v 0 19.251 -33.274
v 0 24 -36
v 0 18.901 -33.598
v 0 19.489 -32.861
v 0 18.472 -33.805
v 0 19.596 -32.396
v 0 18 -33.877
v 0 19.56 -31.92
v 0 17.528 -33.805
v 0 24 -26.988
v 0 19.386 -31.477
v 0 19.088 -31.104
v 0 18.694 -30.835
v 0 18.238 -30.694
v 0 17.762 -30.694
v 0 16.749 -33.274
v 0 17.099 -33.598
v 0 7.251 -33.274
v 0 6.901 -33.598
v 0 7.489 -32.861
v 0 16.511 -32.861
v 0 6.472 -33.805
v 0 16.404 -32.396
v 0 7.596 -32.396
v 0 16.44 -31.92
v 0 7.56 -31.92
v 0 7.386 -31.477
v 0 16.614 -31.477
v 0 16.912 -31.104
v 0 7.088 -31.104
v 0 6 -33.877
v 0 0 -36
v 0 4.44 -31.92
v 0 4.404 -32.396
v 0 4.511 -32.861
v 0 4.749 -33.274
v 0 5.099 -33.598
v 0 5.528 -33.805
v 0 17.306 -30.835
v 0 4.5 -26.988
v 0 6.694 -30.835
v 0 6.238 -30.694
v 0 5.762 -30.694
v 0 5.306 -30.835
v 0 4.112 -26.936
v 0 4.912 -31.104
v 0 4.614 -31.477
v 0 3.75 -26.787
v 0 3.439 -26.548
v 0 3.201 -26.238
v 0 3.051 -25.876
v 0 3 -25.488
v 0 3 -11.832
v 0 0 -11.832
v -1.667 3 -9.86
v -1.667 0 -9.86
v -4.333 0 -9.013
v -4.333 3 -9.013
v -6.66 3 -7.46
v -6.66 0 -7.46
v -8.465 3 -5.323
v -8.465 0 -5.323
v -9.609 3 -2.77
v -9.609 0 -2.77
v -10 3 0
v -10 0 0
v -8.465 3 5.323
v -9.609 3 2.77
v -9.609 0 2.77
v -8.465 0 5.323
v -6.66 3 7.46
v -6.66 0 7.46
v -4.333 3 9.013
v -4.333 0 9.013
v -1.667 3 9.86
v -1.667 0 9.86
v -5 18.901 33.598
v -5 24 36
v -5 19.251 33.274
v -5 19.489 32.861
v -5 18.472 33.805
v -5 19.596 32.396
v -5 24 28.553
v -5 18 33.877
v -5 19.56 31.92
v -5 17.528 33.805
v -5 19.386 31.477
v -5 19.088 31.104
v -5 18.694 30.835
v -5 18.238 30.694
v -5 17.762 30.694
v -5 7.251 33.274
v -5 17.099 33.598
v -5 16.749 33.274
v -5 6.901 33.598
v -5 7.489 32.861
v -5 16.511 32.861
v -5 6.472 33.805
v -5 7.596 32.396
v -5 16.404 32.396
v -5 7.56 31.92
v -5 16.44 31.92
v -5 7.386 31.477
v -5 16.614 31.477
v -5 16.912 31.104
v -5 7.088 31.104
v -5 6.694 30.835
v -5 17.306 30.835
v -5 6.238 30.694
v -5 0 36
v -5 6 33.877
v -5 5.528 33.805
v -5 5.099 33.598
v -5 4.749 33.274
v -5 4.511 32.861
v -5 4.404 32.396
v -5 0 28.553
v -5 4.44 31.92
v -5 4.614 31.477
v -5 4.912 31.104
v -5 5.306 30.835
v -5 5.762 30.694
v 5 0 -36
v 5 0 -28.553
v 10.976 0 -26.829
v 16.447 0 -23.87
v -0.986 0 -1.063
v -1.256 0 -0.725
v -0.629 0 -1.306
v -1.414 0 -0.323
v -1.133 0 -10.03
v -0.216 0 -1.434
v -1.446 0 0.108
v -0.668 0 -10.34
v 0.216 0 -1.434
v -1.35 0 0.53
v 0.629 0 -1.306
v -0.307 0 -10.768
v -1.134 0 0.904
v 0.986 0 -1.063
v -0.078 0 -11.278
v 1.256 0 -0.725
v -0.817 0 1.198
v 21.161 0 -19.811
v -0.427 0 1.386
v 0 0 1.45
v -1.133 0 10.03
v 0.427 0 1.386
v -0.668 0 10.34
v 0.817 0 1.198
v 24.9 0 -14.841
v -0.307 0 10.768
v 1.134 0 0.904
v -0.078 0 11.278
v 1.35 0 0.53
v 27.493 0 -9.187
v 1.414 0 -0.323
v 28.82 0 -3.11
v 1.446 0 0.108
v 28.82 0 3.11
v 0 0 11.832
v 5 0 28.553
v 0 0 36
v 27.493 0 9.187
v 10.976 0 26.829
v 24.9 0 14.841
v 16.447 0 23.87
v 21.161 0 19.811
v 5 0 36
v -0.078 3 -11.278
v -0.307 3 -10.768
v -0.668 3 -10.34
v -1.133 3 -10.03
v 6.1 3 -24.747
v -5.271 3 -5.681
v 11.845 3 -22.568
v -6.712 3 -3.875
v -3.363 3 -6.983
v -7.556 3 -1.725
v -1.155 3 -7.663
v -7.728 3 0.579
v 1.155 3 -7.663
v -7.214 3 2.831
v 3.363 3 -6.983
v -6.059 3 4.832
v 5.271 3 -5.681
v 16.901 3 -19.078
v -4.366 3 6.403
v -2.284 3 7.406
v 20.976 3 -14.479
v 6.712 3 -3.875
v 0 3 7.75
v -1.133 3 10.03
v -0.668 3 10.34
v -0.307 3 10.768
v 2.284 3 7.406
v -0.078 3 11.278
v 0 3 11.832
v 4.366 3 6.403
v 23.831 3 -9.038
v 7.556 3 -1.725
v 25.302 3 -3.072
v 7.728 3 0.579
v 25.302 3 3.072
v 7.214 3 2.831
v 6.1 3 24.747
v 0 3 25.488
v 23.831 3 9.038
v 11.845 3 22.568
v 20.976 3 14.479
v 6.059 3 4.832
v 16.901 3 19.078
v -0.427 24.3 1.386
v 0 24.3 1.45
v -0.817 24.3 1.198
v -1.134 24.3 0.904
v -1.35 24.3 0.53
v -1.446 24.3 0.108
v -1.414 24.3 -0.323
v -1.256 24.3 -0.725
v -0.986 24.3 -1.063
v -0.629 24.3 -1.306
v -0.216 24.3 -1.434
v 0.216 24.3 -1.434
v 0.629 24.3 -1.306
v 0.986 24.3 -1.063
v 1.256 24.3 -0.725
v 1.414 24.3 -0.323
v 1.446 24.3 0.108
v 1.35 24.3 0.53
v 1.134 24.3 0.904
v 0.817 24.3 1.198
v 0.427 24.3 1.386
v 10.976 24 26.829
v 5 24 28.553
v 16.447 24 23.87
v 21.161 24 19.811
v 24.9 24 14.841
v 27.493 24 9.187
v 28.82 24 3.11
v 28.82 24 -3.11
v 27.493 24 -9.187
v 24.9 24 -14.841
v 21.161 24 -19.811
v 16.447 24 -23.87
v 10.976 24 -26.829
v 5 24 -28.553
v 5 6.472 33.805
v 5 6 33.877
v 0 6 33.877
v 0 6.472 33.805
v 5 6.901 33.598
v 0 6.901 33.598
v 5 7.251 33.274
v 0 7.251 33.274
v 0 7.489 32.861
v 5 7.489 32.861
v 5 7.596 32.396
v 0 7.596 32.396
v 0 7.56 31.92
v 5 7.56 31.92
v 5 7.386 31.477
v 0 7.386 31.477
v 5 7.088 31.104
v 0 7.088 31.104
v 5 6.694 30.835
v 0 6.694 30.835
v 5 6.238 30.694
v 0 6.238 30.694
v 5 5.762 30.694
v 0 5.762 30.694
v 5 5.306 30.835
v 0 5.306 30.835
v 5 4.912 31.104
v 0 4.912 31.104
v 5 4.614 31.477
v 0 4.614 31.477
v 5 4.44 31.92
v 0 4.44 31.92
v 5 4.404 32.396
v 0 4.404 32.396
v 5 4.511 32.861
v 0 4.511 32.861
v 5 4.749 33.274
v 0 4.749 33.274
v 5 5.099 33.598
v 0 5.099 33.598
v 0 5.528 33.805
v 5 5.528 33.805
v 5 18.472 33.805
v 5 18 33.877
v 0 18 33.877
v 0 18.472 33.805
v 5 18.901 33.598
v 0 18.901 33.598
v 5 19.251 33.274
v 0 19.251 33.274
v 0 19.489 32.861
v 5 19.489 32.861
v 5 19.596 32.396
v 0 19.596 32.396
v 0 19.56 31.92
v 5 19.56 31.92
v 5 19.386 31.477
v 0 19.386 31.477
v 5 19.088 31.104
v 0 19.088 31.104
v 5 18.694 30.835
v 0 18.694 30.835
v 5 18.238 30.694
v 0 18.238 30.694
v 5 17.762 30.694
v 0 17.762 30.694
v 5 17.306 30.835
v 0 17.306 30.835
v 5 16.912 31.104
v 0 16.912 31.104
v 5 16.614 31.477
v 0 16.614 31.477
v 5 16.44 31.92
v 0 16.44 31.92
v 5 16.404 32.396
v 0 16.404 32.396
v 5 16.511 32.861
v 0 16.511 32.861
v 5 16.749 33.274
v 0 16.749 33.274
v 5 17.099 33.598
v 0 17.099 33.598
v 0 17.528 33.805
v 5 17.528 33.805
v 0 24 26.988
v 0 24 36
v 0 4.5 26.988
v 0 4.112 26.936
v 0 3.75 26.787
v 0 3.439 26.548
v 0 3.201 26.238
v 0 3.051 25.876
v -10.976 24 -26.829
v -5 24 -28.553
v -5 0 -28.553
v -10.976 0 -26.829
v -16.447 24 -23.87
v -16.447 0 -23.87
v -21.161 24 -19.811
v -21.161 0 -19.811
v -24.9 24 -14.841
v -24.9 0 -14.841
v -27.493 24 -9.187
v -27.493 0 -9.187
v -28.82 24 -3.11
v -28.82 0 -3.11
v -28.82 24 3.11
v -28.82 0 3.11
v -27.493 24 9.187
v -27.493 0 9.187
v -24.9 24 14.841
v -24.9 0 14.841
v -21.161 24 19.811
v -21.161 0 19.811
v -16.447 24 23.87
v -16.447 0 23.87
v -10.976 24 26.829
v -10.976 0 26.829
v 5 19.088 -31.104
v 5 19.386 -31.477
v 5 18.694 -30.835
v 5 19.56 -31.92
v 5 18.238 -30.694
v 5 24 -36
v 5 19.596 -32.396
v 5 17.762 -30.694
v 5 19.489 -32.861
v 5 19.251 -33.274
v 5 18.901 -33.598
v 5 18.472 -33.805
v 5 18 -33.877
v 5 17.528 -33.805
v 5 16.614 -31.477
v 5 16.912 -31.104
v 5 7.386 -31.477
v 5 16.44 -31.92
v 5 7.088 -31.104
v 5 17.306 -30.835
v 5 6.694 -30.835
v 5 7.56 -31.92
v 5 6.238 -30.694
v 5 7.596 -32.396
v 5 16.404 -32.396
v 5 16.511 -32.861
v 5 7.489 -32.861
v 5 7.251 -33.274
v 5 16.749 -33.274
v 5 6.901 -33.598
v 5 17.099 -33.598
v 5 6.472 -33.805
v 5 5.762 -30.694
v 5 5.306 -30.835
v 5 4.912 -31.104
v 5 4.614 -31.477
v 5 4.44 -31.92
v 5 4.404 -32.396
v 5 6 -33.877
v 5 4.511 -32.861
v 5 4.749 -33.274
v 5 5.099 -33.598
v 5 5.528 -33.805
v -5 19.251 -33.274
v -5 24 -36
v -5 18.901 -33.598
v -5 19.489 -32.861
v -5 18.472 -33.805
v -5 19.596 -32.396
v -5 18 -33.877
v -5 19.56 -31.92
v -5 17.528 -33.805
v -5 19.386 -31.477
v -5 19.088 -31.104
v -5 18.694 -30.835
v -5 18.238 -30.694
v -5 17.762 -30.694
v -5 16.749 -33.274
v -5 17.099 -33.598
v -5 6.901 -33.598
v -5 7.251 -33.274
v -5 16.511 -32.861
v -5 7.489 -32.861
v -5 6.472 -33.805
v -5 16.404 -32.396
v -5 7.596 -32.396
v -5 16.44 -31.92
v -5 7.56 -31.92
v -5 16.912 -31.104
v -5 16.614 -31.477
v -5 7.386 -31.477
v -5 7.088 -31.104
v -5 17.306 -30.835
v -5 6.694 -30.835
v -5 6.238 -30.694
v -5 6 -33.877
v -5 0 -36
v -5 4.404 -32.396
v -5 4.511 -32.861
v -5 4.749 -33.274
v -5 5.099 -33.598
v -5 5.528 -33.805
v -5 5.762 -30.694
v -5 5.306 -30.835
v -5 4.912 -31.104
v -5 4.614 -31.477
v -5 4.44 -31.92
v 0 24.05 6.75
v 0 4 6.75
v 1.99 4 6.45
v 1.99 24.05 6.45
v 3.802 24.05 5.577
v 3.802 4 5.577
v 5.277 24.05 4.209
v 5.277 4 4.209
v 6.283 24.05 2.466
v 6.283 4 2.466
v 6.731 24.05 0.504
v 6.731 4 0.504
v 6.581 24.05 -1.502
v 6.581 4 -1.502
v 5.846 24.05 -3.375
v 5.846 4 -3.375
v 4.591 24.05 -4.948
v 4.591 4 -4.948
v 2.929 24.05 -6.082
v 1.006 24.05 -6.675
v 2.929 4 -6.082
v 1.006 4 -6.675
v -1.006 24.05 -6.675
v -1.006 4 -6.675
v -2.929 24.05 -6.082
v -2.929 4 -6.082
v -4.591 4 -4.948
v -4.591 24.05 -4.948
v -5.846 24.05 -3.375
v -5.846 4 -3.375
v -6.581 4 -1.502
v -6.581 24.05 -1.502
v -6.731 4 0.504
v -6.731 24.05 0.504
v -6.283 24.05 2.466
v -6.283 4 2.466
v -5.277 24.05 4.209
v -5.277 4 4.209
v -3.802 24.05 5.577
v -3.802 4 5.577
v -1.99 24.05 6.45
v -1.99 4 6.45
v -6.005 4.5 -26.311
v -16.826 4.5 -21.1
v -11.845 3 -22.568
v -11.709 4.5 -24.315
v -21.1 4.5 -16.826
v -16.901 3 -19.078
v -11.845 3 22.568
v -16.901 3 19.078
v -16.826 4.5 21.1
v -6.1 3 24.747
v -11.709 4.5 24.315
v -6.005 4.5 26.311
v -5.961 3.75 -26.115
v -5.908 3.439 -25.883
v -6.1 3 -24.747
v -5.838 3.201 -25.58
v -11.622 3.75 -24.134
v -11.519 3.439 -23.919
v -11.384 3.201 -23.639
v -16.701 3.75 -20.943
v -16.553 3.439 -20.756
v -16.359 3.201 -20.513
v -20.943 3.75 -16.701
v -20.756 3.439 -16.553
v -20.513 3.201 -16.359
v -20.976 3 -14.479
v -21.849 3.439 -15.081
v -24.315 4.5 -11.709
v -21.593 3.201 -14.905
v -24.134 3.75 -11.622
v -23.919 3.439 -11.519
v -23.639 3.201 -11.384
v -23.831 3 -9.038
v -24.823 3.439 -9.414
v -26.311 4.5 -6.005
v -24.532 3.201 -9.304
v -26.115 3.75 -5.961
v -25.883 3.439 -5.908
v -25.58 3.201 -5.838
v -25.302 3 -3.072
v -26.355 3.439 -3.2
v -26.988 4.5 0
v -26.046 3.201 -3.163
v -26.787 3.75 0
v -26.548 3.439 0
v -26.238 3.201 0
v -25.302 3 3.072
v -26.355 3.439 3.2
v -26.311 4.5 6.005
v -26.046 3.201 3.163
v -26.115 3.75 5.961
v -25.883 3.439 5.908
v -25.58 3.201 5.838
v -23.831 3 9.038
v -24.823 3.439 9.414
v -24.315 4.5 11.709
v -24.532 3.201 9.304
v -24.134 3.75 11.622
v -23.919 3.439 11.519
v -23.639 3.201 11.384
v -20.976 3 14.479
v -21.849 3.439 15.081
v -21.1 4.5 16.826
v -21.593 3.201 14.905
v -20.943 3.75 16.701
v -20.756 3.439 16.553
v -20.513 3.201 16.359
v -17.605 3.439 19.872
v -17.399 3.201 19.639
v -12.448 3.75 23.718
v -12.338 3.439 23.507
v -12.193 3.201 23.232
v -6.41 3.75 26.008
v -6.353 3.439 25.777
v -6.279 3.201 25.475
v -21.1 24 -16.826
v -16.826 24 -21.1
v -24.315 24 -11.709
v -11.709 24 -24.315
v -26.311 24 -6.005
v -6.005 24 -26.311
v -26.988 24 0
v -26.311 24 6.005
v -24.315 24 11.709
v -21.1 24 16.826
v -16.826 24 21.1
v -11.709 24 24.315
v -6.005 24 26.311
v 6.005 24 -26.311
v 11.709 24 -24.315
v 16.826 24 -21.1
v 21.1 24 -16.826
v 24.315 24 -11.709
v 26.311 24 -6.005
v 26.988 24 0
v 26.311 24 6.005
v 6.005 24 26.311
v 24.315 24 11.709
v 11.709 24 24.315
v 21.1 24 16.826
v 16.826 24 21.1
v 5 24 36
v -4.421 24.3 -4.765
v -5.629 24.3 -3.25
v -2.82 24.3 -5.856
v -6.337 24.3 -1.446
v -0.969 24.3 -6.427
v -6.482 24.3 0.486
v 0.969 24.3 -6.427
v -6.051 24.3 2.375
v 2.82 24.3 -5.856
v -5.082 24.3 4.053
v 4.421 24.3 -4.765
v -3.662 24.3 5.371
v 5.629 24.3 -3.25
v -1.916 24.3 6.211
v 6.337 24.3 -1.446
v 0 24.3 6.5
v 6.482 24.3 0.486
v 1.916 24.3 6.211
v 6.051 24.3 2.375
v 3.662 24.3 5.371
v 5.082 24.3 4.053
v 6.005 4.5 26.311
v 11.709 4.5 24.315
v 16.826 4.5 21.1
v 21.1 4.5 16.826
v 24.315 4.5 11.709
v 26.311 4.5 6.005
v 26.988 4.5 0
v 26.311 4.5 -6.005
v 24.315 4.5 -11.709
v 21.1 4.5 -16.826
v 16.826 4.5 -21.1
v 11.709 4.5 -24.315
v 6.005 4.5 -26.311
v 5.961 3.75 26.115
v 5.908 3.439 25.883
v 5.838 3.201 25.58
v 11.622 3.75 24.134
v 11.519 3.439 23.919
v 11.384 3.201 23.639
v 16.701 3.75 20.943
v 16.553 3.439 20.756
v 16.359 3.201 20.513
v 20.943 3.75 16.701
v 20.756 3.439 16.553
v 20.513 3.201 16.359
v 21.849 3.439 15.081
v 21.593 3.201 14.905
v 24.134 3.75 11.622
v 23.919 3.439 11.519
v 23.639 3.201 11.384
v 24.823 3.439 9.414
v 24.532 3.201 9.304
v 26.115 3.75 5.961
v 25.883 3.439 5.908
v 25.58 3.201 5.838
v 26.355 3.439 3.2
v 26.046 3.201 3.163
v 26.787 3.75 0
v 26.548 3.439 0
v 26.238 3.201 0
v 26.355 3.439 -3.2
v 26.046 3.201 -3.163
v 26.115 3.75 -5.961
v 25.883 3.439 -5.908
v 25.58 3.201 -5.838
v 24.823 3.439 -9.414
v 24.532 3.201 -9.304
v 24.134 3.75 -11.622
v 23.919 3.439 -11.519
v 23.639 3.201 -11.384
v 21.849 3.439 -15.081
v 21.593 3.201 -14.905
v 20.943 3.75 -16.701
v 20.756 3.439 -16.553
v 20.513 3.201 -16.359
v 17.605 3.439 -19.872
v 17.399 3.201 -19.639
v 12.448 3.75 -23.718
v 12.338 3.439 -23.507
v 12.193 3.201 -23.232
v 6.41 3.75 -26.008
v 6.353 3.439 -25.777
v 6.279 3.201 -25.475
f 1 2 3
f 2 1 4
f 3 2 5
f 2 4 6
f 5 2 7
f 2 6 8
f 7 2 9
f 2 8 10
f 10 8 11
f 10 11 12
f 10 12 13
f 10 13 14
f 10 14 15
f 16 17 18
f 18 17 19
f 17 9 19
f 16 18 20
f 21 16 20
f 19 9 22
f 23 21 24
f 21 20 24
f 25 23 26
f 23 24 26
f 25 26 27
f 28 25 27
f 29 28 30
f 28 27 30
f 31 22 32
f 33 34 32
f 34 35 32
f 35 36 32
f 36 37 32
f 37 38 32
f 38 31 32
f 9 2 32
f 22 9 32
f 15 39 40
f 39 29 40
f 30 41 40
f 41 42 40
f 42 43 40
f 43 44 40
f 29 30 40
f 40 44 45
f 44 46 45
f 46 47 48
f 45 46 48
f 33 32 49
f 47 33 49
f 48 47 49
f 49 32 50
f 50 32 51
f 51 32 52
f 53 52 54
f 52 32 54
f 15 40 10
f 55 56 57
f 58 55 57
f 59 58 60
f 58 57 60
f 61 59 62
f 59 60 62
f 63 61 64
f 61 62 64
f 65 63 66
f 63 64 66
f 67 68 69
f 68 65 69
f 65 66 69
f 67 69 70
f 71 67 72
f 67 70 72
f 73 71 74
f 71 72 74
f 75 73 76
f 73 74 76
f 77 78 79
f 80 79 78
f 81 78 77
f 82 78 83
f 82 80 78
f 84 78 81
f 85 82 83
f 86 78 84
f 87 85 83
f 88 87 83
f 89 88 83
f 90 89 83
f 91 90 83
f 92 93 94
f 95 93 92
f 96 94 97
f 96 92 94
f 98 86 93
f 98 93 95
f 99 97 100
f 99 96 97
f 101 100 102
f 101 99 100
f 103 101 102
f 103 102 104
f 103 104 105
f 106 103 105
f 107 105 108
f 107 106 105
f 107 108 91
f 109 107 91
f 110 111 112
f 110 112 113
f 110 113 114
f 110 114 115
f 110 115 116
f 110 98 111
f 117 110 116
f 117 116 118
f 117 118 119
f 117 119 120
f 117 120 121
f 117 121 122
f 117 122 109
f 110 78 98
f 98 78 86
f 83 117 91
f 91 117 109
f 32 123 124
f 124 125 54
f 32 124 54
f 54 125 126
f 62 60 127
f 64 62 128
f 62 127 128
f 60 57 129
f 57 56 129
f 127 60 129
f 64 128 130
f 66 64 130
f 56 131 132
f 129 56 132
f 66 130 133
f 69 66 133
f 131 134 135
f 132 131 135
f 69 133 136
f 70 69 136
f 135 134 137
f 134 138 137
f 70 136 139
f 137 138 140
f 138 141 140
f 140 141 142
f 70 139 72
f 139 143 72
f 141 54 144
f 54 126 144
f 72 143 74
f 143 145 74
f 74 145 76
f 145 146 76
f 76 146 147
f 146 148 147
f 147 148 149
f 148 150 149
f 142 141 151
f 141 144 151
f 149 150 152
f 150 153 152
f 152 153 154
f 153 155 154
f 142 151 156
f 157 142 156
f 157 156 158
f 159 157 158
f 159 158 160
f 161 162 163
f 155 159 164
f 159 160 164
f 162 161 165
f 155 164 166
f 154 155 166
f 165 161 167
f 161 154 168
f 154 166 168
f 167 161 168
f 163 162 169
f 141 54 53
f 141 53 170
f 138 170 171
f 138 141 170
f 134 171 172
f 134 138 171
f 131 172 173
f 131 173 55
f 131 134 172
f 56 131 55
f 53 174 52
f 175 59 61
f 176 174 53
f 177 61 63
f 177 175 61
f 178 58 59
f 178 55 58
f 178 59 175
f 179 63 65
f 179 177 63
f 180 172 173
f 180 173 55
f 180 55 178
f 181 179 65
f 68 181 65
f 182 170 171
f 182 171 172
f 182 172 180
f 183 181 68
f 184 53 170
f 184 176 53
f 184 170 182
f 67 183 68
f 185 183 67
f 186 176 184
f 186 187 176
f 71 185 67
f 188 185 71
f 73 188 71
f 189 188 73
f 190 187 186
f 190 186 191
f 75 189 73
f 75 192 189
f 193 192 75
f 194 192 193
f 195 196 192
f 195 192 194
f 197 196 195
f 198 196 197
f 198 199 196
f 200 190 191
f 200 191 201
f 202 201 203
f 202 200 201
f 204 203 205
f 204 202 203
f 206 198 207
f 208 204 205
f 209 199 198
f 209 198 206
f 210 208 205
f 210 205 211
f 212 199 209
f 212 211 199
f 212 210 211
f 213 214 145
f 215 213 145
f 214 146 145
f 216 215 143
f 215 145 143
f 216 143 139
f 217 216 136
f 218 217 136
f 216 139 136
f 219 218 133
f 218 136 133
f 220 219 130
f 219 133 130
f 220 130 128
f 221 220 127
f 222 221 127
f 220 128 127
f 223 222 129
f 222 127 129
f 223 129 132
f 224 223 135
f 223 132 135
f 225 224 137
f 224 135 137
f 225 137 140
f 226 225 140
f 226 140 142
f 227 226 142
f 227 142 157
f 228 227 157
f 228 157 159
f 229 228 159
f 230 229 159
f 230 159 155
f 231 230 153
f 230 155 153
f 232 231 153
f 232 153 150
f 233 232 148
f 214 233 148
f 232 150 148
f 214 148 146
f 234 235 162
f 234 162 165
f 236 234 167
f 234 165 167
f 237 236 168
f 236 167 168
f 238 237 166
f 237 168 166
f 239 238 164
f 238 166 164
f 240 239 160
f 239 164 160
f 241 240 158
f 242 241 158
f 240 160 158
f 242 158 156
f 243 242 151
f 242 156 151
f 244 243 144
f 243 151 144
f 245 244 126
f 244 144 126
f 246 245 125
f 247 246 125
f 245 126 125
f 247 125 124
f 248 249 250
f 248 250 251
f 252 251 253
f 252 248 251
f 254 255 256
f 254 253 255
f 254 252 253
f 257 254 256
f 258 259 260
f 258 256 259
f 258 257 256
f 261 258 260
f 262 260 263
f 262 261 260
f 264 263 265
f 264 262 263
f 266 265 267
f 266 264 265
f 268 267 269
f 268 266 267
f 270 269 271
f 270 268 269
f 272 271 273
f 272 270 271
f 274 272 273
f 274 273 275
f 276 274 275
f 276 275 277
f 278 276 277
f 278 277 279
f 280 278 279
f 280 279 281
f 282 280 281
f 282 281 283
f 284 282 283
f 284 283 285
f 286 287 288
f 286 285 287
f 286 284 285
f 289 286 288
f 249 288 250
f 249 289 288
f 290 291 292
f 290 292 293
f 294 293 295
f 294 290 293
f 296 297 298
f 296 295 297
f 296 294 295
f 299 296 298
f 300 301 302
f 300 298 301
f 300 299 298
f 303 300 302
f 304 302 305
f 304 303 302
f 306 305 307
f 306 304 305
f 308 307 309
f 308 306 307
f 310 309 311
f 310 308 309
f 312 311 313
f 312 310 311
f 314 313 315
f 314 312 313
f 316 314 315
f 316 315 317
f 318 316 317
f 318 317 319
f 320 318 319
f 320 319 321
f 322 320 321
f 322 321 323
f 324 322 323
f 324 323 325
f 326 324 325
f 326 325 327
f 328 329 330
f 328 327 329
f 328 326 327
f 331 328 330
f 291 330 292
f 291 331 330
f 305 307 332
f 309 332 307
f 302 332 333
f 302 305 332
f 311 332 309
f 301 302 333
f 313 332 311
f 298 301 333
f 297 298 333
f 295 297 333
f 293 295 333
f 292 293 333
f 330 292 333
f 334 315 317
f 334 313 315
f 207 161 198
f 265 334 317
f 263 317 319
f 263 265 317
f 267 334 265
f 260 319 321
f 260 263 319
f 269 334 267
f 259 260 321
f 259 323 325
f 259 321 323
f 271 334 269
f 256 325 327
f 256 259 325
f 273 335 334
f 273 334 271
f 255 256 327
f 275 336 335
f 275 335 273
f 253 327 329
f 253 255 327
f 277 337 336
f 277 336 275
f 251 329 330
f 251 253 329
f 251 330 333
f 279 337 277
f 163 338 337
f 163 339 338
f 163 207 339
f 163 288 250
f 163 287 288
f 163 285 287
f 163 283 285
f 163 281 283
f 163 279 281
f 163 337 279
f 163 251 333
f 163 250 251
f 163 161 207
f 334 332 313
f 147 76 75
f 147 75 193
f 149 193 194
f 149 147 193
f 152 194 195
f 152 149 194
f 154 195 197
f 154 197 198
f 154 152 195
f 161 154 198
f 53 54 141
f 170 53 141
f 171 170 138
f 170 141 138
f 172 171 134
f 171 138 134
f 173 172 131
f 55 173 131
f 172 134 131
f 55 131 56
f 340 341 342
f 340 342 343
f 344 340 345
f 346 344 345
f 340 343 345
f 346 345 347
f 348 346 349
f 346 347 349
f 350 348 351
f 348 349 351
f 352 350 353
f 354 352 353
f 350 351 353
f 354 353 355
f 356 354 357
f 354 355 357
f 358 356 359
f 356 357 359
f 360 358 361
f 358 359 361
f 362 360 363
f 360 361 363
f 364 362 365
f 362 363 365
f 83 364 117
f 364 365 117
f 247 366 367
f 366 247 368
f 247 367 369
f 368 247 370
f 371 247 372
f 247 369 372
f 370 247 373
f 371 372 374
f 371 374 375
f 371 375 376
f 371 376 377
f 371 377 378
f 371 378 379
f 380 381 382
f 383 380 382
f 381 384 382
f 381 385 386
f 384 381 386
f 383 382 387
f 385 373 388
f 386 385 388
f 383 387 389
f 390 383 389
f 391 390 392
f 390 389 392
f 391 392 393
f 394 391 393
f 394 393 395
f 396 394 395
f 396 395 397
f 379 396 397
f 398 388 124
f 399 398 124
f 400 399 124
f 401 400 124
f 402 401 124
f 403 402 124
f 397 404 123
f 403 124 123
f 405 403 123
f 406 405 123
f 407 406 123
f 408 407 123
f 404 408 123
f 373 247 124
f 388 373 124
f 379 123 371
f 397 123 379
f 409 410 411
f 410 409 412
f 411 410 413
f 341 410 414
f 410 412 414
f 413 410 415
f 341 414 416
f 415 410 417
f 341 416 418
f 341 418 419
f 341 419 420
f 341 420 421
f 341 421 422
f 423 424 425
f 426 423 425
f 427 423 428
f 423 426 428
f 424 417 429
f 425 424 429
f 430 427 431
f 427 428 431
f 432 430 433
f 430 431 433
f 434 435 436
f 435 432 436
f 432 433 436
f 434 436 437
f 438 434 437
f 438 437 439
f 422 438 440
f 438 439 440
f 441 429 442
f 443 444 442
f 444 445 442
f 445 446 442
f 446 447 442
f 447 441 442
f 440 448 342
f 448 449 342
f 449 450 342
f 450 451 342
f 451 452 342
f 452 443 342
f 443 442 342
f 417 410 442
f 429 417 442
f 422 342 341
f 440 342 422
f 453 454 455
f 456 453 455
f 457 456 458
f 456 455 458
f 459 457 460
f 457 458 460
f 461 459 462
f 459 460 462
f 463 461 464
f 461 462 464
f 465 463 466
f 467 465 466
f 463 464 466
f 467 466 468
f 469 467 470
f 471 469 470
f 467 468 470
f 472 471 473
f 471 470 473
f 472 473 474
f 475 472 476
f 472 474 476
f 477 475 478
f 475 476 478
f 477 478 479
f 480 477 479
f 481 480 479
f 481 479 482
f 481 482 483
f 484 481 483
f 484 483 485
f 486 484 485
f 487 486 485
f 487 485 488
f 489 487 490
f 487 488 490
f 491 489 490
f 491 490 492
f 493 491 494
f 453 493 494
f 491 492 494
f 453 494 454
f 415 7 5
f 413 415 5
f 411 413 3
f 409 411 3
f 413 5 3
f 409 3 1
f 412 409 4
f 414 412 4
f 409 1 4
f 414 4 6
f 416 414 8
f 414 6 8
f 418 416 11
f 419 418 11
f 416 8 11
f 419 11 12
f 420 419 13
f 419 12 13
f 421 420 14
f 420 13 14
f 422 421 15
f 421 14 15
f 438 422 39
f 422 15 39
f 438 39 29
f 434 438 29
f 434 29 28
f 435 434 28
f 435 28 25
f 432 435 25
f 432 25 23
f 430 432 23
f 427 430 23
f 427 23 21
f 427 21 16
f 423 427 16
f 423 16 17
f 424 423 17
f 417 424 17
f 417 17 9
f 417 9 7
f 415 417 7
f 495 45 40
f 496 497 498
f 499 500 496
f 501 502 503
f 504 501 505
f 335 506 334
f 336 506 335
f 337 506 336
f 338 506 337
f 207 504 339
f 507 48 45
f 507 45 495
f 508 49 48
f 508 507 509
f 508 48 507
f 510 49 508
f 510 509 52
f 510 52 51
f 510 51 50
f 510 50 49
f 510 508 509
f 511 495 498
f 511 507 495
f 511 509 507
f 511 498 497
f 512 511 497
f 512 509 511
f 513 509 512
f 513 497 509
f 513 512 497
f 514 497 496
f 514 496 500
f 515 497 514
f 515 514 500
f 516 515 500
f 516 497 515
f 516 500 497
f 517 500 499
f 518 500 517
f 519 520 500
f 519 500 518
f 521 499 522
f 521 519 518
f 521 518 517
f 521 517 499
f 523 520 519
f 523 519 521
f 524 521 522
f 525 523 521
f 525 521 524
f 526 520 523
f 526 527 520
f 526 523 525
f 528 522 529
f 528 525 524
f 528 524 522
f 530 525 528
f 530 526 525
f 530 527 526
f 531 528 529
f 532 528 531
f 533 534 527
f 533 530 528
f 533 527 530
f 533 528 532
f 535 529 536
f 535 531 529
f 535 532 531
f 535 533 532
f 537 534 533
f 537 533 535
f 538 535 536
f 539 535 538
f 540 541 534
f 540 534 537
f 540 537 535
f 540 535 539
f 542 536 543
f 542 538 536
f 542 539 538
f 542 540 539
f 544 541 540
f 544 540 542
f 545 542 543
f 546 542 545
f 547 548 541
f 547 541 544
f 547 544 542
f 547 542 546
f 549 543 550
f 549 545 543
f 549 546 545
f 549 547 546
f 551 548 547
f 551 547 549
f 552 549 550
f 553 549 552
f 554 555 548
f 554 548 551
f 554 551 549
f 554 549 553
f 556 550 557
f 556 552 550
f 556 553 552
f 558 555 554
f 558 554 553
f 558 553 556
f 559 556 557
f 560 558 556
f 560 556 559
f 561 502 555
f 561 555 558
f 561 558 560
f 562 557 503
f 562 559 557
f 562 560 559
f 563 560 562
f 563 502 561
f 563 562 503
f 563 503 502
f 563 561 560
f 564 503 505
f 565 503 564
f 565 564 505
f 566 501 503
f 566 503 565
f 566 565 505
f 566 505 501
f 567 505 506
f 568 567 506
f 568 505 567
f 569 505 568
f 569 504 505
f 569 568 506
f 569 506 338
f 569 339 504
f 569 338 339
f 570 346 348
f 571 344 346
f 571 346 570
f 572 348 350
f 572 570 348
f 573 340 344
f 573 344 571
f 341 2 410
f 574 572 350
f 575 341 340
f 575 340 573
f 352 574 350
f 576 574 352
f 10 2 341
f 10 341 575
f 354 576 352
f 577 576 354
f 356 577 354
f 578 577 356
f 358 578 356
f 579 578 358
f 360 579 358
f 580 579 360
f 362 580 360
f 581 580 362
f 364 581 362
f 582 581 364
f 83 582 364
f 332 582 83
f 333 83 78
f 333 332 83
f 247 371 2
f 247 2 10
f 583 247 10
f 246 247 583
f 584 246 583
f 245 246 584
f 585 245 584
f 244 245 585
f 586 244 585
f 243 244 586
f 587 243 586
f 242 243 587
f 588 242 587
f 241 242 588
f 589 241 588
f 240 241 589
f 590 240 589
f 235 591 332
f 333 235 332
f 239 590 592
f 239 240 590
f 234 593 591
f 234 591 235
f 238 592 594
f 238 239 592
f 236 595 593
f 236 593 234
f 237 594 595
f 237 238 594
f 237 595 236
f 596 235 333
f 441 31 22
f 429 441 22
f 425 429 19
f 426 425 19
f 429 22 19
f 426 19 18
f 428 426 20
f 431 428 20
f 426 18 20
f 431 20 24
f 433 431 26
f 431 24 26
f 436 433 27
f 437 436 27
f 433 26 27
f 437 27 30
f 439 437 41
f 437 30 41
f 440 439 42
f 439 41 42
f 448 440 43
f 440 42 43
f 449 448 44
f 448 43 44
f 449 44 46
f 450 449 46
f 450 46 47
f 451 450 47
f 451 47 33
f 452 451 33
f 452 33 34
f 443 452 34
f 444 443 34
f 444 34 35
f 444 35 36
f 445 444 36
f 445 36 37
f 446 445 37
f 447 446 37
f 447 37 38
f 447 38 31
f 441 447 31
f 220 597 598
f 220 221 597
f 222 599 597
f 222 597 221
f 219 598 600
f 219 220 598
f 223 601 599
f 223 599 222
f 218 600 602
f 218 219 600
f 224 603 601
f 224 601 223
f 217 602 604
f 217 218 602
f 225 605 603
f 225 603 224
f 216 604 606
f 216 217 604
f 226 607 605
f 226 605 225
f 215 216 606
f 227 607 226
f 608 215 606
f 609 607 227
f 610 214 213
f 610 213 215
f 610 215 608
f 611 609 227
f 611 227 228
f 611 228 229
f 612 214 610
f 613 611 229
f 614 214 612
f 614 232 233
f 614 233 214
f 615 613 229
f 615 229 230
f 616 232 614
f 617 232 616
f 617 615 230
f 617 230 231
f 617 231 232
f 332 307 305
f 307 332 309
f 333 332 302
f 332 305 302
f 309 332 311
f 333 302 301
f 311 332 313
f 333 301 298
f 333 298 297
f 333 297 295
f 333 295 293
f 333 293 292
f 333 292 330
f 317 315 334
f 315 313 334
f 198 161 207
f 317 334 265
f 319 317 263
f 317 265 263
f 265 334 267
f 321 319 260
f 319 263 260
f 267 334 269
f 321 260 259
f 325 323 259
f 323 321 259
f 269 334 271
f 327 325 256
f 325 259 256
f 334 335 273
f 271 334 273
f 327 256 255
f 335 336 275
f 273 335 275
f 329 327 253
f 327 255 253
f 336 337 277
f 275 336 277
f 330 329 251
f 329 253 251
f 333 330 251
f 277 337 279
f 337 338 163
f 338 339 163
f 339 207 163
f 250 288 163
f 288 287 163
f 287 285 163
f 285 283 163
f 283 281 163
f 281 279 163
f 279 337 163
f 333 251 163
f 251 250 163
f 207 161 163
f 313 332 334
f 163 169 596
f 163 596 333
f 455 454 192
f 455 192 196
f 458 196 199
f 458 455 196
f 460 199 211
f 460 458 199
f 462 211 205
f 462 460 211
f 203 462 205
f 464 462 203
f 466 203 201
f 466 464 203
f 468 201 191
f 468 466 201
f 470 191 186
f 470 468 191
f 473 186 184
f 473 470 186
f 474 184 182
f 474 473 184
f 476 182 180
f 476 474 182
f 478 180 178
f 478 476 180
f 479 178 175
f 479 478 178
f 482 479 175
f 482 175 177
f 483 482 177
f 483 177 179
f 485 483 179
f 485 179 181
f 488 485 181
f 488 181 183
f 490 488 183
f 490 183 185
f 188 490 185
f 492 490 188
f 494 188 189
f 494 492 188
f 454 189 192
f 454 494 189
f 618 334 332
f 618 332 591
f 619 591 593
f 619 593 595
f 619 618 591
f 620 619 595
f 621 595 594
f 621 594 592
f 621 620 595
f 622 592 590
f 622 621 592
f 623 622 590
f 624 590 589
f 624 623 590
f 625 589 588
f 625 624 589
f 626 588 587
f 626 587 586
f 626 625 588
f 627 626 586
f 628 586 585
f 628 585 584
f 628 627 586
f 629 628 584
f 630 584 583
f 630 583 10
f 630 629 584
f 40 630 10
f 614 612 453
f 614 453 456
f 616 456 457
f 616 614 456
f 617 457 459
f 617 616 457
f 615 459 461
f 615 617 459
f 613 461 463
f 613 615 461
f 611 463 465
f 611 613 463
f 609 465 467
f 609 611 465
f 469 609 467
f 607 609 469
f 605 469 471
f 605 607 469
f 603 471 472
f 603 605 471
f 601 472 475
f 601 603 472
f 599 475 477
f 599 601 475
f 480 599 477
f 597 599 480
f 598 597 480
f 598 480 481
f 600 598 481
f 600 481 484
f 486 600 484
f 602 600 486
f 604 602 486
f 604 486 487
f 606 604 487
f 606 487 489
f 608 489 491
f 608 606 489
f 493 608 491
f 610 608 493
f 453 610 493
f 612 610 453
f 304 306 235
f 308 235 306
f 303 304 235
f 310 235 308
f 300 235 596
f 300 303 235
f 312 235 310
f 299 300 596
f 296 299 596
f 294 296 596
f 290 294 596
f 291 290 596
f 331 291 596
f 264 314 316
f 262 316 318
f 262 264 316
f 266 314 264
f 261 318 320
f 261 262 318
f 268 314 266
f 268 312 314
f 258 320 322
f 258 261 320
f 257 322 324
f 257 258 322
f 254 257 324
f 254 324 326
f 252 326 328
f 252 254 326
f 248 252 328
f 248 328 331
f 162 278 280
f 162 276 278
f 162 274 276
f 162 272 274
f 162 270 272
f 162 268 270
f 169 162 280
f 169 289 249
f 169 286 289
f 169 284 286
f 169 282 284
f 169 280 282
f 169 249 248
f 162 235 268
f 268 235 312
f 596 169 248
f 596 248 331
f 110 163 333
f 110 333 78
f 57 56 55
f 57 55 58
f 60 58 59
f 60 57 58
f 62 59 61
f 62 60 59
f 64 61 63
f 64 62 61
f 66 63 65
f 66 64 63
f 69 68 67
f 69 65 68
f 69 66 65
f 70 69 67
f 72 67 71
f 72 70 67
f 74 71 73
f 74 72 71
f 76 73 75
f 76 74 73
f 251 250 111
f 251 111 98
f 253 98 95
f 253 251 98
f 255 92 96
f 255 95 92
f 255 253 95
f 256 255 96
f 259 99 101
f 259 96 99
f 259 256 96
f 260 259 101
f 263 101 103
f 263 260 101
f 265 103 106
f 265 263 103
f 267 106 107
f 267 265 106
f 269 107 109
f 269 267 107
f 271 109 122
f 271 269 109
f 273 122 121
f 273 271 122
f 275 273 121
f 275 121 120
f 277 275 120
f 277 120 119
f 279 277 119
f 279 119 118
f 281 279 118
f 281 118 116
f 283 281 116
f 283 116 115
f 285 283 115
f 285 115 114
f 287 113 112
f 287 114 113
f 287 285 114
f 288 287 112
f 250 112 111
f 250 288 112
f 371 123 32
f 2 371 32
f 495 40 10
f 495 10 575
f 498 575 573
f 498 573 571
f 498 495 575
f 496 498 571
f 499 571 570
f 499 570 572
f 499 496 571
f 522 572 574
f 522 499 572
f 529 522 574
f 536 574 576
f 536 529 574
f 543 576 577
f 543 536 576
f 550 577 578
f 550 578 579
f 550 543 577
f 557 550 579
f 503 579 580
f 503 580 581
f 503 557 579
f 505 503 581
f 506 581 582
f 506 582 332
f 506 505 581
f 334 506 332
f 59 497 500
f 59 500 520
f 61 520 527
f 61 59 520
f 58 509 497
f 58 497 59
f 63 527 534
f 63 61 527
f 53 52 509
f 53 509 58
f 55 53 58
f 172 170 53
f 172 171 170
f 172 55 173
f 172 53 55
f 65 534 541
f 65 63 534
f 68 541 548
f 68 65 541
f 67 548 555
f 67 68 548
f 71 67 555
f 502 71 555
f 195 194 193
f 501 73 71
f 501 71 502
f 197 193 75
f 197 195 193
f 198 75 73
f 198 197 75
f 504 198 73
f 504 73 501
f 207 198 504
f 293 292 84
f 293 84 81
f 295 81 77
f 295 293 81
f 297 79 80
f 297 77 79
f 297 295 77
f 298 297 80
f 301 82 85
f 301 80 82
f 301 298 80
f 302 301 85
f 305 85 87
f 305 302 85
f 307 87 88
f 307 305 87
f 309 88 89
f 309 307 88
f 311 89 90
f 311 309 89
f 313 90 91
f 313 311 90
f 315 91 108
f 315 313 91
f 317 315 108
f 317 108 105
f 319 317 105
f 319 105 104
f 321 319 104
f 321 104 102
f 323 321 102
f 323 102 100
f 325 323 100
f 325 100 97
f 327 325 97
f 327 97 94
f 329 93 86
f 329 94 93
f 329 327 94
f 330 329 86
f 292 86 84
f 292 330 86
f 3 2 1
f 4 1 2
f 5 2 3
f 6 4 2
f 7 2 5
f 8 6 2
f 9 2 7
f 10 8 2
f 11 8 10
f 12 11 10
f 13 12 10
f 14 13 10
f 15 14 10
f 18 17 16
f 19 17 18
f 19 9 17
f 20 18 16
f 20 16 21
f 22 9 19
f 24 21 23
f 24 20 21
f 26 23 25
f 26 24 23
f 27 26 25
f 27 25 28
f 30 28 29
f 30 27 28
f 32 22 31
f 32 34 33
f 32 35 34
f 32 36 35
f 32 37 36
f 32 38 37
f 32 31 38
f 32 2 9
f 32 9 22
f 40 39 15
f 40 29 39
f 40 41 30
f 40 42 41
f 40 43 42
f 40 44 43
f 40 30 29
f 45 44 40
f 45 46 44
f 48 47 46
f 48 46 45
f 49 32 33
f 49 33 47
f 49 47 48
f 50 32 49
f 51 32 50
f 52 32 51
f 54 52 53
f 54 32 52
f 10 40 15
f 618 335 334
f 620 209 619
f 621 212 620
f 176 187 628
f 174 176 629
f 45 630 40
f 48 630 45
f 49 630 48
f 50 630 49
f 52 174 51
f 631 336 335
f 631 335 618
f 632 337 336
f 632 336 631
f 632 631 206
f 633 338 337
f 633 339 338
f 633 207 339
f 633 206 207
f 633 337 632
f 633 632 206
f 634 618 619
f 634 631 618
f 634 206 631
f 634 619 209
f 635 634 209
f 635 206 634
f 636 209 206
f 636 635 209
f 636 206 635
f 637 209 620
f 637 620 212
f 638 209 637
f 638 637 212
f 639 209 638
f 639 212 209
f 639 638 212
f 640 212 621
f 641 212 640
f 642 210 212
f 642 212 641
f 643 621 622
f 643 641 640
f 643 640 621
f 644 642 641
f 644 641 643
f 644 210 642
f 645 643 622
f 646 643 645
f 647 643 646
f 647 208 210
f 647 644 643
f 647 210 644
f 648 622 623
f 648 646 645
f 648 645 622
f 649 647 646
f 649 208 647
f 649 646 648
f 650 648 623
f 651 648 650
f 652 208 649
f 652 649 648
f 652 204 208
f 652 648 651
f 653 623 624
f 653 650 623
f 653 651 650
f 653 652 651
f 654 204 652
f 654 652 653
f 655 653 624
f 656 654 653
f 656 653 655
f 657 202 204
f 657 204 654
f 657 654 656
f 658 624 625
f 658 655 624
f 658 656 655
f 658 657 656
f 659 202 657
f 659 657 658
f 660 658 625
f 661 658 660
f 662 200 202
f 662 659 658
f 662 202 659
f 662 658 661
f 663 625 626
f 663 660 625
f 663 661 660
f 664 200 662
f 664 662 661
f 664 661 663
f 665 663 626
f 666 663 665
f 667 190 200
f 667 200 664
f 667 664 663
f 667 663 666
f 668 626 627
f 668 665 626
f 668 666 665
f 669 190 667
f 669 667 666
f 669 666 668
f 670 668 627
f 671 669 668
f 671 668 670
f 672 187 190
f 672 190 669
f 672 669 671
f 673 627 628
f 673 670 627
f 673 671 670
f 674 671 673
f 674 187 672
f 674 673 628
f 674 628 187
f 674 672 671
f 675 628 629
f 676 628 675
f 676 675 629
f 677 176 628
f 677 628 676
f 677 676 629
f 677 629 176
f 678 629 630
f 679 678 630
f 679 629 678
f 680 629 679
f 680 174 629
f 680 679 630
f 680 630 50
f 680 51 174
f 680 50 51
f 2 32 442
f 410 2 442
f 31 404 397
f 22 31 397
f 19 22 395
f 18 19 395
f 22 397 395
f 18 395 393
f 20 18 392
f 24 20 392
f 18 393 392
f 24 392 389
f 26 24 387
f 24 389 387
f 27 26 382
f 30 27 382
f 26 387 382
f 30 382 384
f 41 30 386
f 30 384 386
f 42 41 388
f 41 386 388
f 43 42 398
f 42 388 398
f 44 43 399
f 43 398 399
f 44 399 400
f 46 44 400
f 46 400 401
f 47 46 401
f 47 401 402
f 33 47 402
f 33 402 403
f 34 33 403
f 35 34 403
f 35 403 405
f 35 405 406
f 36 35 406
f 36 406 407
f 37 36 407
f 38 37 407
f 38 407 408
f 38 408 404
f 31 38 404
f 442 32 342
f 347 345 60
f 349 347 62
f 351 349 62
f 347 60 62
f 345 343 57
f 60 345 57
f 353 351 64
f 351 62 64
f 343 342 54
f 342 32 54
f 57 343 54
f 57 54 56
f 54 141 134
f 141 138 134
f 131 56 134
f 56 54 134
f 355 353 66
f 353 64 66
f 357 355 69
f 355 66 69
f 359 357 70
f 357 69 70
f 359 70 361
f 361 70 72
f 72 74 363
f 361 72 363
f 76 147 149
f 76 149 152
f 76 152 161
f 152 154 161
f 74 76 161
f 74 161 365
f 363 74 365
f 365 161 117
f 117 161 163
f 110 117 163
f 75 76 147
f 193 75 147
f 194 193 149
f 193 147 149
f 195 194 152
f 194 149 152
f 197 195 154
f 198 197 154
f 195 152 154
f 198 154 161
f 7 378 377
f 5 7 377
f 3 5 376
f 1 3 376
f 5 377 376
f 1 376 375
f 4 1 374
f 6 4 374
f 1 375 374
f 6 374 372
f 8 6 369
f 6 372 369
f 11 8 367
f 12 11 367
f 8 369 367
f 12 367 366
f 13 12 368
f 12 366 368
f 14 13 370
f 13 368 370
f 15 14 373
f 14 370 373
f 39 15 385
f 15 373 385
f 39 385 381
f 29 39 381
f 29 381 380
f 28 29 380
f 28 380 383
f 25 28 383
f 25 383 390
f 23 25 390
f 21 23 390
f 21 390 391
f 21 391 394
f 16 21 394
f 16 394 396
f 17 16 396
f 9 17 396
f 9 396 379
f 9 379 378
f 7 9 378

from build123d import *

# Parameters (mm, degrees)
SKETCH1_R              = 28.9875
SKETCH1_R_2            = 26.9875
BOSS_EXTRUDE1_DEPTH    = 24
SKETCH1_2_R            = 26.9875
BOSS_EXTRUDE2_DEPTH    = 3
FILLET1_R              = 1.5
SKETCH2_R              = 6.75
BOSS_EXTRUDE3_DEPTH    = 21.3
BOSS_EXTRUDE4_START    = -24
BOSS_EXTRUDE4_DEPTH    = 24
M3_CLEARANCE_HOLE1_D   = 3.2
CHAMFER1_SIZE          = 1
SPLIT1_SURFACE_1_BACK  = 96.58
SPLIT1_SURFACE_1_DEPTH = 193.16
SPLIT1_SURFACE_2_BACK  = 96.58
SPLIT1_SURFACE_2_DEPTH = 193.16
CHAMFER3_SIZE          = 0.25
SKETCH12_W             = 1.45
SKETCH12_H             = 24.3


with BuildPart() as part:
    # Sketch1 → Boss-Extrude1 (new body)
    with BuildSketch(Plane(origin=(0, 0, 0), x_dir=(1, 0, 0), z_dir=(0, 1, 0))):
        with Locations(Location((0, 0, 0), (0, 0, 270))):
            Circle(SKETCH1_R)
        with Locations(Location((0, 0, 0), (0, 0, 270))):
            Circle(SKETCH1_R_2, mode=Mode.SUBTRACT)
    extrude(amount=BOSS_EXTRUDE1_DEPTH)

    # Sketch1<2> → Boss-Extrude2 (add)
    with BuildSketch(Plane(origin=(0, 0, 0), x_dir=(1, 0, 0), z_dir=(0, 1, 0))):
        with Locations(Location((0, 0, 0), (0, 0, 270))):
            Circle(SKETCH1_2_R)
    extrude(amount=BOSS_EXTRUDE2_DEPTH)

    # Fillet1
    fillet1_edges = [part.edges().sort_by_distance(p)[0] for p in [
        (0, 3, -26.9875),
    ]]
    fillet(fillet1_edges, radius=FILLET1_R)

    # Sketch2 → Boss-Extrude3 (add)
    with BuildSketch(Plane(origin=(0, 3, 0), x_dir=(1, 0, 0), z_dir=(0, 1, 0))):
        with Locations(Location((0, 0, 0), (0, 0, 270))):
            Circle(SKETCH2_R)
    extrude(amount=BOSS_EXTRUDE3_DEPTH)

    # Sketch3 → Boss-Extrude4 (add)
    with BuildSketch(Plane(origin=(0, 24, 0), x_dir=(1, 0, 0), z_dir=(0, 1, 0)).offset(BOSS_EXTRUDE4_START)):
        with BuildLine():
            ThreePointArc((-5, 28.553023592), (-2.509420737, 28.878676628), (0, 28.9875))
            Line((0, 28.9875), (0, 36))
            Line((0, 36), (-5, 36))
            Line((-5, 36), (-5, 28.553023592))
        make_face()
        with BuildLine():
            Line((0, 36), (0, 28.9875))
            ThreePointArc((0, 28.9875), (2.509420737, 28.878676628), (5, 28.553023592))
            Line((5, 28.553023592), (5, 36))
            Line((5, 36), (0, 36))
        make_face()
    boss_extrude4 = extrude(amount=BOSS_EXTRUDE4_DEPTH)

    # M3 Clearance Hole1 (through all)
    with Locations(Plane.ZY.offset(5)):
        with Locations((-32.276511796, 18), (-32.276511796, 6)):
            m3_clearance_hole1 = Hole(M3_CLEARANCE_HOLE1_D / 2)

    # Chamfer1
    chamfer1_edges = [part.edges().sort_by_distance(p)[0] for p in [
        (0, 3, -6.75),
    ]]
    chamfer(chamfer1_edges, length=CHAMFER1_SIZE)

    # Mirror1: Boss-Extrude4, M3 Clearance Hole1 across plane
    add(boss_extrude4.mirror(Plane.XY))
    add(m3_clearance_hole1.mirror(Plane.XY), mode=Mode.SUBTRACT)


with BuildPart() as body_2:
    # Split1: the piece behind the surface
    add(part.part)
    # Split1 surface: a surface, the sketch's curves swept straight by 193.16 mm
    with BuildLine(Plane(origin=(0, 24, 0), x_dir=(1, 0, 0), z_dir=(0, 1, 0)).offset(-SPLIT1_SURFACE_1_BACK), mode=Mode.PRIVATE) as split1_surface_1_path:
        Line((0, 36), (0, 11.832159566))
        ThreePointArc((0, 11.832159566), (-0.472474768, 10.541165117), (-1.666666667, 9.860132972))
        ThreePointArc((-1.666666667, 9.860132972), (-10, 0), (-1.666666667, -9.860132972))
        ThreePointArc((-1.666666667, -9.860132972), (-0.472474768, -10.541165117), (0, -11.832159566))
        Line((0, -11.832159566), (0, -36))
    split1_surface_1 = Shell.extrude(split1_surface_1_path.wire(), (0 * SPLIT1_SURFACE_1_DEPTH, 1 * SPLIT1_SURFACE_1_DEPTH, 0 * SPLIT1_SURFACE_1_DEPTH))
    split(bisect_by=split1_surface_1, keep=Keep.BOTTOM)


with BuildPart() as part_1:
    add(part.part)

    # Split1: split by a surface, the side it looks to stays
    # Split1 surface: a surface, the sketch's curves swept straight by 193.16 mm
    with BuildLine(Plane(origin=(0, 24, 0), x_dir=(1, 0, 0), z_dir=(0, 1, 0)).offset(-SPLIT1_SURFACE_2_BACK), mode=Mode.PRIVATE) as split1_surface_2_path:
        Line((0, 36), (0, 11.832159566))
        ThreePointArc((0, 11.832159566), (-0.472474768, 10.541165117), (-1.666666667, 9.860132972))
        ThreePointArc((-1.666666667, 9.860132972), (-10, 0), (-1.666666667, -9.860132972))
        ThreePointArc((-1.666666667, -9.860132972), (-0.472474768, -10.541165117), (0, -11.832159566))
        Line((0, -11.832159566), (0, -36))
    split1_surface_2 = Shell.extrude(split1_surface_2_path.wire(), (0 * SPLIT1_SURFACE_2_DEPTH, 1 * SPLIT1_SURFACE_2_DEPTH, 0 * SPLIT1_SURFACE_2_DEPTH))
    split(bisect_by=split1_surface_2, keep=Keep.TOP)

    # Chamfer3
    chamfer3_edges = [part_1.edges().sort_by_distance(p)[0] for p in [
        (0, 24.3, -6.75),
    ]]
    chamfer(chamfer3_edges, length=CHAMFER3_SIZE)

    # Sketch12 → M3x0.5 Tapped Hole1 (revolve, cut)
    with BuildSketch(Plane(origin=(0, 24.3, 0), x_dir=(0, 0, 1), z_dir=(1, 0, 0))):
        with Locations((0.725, 12.15)):
            Rectangle(SKETCH12_W, SKETCH12_H)
    revolve(axis=Axis((0, 30.65, 0), (0, -1, 0)), mode=Mode.SUBTRACT)


solid = Compound([body_2.part, part_1.part])
